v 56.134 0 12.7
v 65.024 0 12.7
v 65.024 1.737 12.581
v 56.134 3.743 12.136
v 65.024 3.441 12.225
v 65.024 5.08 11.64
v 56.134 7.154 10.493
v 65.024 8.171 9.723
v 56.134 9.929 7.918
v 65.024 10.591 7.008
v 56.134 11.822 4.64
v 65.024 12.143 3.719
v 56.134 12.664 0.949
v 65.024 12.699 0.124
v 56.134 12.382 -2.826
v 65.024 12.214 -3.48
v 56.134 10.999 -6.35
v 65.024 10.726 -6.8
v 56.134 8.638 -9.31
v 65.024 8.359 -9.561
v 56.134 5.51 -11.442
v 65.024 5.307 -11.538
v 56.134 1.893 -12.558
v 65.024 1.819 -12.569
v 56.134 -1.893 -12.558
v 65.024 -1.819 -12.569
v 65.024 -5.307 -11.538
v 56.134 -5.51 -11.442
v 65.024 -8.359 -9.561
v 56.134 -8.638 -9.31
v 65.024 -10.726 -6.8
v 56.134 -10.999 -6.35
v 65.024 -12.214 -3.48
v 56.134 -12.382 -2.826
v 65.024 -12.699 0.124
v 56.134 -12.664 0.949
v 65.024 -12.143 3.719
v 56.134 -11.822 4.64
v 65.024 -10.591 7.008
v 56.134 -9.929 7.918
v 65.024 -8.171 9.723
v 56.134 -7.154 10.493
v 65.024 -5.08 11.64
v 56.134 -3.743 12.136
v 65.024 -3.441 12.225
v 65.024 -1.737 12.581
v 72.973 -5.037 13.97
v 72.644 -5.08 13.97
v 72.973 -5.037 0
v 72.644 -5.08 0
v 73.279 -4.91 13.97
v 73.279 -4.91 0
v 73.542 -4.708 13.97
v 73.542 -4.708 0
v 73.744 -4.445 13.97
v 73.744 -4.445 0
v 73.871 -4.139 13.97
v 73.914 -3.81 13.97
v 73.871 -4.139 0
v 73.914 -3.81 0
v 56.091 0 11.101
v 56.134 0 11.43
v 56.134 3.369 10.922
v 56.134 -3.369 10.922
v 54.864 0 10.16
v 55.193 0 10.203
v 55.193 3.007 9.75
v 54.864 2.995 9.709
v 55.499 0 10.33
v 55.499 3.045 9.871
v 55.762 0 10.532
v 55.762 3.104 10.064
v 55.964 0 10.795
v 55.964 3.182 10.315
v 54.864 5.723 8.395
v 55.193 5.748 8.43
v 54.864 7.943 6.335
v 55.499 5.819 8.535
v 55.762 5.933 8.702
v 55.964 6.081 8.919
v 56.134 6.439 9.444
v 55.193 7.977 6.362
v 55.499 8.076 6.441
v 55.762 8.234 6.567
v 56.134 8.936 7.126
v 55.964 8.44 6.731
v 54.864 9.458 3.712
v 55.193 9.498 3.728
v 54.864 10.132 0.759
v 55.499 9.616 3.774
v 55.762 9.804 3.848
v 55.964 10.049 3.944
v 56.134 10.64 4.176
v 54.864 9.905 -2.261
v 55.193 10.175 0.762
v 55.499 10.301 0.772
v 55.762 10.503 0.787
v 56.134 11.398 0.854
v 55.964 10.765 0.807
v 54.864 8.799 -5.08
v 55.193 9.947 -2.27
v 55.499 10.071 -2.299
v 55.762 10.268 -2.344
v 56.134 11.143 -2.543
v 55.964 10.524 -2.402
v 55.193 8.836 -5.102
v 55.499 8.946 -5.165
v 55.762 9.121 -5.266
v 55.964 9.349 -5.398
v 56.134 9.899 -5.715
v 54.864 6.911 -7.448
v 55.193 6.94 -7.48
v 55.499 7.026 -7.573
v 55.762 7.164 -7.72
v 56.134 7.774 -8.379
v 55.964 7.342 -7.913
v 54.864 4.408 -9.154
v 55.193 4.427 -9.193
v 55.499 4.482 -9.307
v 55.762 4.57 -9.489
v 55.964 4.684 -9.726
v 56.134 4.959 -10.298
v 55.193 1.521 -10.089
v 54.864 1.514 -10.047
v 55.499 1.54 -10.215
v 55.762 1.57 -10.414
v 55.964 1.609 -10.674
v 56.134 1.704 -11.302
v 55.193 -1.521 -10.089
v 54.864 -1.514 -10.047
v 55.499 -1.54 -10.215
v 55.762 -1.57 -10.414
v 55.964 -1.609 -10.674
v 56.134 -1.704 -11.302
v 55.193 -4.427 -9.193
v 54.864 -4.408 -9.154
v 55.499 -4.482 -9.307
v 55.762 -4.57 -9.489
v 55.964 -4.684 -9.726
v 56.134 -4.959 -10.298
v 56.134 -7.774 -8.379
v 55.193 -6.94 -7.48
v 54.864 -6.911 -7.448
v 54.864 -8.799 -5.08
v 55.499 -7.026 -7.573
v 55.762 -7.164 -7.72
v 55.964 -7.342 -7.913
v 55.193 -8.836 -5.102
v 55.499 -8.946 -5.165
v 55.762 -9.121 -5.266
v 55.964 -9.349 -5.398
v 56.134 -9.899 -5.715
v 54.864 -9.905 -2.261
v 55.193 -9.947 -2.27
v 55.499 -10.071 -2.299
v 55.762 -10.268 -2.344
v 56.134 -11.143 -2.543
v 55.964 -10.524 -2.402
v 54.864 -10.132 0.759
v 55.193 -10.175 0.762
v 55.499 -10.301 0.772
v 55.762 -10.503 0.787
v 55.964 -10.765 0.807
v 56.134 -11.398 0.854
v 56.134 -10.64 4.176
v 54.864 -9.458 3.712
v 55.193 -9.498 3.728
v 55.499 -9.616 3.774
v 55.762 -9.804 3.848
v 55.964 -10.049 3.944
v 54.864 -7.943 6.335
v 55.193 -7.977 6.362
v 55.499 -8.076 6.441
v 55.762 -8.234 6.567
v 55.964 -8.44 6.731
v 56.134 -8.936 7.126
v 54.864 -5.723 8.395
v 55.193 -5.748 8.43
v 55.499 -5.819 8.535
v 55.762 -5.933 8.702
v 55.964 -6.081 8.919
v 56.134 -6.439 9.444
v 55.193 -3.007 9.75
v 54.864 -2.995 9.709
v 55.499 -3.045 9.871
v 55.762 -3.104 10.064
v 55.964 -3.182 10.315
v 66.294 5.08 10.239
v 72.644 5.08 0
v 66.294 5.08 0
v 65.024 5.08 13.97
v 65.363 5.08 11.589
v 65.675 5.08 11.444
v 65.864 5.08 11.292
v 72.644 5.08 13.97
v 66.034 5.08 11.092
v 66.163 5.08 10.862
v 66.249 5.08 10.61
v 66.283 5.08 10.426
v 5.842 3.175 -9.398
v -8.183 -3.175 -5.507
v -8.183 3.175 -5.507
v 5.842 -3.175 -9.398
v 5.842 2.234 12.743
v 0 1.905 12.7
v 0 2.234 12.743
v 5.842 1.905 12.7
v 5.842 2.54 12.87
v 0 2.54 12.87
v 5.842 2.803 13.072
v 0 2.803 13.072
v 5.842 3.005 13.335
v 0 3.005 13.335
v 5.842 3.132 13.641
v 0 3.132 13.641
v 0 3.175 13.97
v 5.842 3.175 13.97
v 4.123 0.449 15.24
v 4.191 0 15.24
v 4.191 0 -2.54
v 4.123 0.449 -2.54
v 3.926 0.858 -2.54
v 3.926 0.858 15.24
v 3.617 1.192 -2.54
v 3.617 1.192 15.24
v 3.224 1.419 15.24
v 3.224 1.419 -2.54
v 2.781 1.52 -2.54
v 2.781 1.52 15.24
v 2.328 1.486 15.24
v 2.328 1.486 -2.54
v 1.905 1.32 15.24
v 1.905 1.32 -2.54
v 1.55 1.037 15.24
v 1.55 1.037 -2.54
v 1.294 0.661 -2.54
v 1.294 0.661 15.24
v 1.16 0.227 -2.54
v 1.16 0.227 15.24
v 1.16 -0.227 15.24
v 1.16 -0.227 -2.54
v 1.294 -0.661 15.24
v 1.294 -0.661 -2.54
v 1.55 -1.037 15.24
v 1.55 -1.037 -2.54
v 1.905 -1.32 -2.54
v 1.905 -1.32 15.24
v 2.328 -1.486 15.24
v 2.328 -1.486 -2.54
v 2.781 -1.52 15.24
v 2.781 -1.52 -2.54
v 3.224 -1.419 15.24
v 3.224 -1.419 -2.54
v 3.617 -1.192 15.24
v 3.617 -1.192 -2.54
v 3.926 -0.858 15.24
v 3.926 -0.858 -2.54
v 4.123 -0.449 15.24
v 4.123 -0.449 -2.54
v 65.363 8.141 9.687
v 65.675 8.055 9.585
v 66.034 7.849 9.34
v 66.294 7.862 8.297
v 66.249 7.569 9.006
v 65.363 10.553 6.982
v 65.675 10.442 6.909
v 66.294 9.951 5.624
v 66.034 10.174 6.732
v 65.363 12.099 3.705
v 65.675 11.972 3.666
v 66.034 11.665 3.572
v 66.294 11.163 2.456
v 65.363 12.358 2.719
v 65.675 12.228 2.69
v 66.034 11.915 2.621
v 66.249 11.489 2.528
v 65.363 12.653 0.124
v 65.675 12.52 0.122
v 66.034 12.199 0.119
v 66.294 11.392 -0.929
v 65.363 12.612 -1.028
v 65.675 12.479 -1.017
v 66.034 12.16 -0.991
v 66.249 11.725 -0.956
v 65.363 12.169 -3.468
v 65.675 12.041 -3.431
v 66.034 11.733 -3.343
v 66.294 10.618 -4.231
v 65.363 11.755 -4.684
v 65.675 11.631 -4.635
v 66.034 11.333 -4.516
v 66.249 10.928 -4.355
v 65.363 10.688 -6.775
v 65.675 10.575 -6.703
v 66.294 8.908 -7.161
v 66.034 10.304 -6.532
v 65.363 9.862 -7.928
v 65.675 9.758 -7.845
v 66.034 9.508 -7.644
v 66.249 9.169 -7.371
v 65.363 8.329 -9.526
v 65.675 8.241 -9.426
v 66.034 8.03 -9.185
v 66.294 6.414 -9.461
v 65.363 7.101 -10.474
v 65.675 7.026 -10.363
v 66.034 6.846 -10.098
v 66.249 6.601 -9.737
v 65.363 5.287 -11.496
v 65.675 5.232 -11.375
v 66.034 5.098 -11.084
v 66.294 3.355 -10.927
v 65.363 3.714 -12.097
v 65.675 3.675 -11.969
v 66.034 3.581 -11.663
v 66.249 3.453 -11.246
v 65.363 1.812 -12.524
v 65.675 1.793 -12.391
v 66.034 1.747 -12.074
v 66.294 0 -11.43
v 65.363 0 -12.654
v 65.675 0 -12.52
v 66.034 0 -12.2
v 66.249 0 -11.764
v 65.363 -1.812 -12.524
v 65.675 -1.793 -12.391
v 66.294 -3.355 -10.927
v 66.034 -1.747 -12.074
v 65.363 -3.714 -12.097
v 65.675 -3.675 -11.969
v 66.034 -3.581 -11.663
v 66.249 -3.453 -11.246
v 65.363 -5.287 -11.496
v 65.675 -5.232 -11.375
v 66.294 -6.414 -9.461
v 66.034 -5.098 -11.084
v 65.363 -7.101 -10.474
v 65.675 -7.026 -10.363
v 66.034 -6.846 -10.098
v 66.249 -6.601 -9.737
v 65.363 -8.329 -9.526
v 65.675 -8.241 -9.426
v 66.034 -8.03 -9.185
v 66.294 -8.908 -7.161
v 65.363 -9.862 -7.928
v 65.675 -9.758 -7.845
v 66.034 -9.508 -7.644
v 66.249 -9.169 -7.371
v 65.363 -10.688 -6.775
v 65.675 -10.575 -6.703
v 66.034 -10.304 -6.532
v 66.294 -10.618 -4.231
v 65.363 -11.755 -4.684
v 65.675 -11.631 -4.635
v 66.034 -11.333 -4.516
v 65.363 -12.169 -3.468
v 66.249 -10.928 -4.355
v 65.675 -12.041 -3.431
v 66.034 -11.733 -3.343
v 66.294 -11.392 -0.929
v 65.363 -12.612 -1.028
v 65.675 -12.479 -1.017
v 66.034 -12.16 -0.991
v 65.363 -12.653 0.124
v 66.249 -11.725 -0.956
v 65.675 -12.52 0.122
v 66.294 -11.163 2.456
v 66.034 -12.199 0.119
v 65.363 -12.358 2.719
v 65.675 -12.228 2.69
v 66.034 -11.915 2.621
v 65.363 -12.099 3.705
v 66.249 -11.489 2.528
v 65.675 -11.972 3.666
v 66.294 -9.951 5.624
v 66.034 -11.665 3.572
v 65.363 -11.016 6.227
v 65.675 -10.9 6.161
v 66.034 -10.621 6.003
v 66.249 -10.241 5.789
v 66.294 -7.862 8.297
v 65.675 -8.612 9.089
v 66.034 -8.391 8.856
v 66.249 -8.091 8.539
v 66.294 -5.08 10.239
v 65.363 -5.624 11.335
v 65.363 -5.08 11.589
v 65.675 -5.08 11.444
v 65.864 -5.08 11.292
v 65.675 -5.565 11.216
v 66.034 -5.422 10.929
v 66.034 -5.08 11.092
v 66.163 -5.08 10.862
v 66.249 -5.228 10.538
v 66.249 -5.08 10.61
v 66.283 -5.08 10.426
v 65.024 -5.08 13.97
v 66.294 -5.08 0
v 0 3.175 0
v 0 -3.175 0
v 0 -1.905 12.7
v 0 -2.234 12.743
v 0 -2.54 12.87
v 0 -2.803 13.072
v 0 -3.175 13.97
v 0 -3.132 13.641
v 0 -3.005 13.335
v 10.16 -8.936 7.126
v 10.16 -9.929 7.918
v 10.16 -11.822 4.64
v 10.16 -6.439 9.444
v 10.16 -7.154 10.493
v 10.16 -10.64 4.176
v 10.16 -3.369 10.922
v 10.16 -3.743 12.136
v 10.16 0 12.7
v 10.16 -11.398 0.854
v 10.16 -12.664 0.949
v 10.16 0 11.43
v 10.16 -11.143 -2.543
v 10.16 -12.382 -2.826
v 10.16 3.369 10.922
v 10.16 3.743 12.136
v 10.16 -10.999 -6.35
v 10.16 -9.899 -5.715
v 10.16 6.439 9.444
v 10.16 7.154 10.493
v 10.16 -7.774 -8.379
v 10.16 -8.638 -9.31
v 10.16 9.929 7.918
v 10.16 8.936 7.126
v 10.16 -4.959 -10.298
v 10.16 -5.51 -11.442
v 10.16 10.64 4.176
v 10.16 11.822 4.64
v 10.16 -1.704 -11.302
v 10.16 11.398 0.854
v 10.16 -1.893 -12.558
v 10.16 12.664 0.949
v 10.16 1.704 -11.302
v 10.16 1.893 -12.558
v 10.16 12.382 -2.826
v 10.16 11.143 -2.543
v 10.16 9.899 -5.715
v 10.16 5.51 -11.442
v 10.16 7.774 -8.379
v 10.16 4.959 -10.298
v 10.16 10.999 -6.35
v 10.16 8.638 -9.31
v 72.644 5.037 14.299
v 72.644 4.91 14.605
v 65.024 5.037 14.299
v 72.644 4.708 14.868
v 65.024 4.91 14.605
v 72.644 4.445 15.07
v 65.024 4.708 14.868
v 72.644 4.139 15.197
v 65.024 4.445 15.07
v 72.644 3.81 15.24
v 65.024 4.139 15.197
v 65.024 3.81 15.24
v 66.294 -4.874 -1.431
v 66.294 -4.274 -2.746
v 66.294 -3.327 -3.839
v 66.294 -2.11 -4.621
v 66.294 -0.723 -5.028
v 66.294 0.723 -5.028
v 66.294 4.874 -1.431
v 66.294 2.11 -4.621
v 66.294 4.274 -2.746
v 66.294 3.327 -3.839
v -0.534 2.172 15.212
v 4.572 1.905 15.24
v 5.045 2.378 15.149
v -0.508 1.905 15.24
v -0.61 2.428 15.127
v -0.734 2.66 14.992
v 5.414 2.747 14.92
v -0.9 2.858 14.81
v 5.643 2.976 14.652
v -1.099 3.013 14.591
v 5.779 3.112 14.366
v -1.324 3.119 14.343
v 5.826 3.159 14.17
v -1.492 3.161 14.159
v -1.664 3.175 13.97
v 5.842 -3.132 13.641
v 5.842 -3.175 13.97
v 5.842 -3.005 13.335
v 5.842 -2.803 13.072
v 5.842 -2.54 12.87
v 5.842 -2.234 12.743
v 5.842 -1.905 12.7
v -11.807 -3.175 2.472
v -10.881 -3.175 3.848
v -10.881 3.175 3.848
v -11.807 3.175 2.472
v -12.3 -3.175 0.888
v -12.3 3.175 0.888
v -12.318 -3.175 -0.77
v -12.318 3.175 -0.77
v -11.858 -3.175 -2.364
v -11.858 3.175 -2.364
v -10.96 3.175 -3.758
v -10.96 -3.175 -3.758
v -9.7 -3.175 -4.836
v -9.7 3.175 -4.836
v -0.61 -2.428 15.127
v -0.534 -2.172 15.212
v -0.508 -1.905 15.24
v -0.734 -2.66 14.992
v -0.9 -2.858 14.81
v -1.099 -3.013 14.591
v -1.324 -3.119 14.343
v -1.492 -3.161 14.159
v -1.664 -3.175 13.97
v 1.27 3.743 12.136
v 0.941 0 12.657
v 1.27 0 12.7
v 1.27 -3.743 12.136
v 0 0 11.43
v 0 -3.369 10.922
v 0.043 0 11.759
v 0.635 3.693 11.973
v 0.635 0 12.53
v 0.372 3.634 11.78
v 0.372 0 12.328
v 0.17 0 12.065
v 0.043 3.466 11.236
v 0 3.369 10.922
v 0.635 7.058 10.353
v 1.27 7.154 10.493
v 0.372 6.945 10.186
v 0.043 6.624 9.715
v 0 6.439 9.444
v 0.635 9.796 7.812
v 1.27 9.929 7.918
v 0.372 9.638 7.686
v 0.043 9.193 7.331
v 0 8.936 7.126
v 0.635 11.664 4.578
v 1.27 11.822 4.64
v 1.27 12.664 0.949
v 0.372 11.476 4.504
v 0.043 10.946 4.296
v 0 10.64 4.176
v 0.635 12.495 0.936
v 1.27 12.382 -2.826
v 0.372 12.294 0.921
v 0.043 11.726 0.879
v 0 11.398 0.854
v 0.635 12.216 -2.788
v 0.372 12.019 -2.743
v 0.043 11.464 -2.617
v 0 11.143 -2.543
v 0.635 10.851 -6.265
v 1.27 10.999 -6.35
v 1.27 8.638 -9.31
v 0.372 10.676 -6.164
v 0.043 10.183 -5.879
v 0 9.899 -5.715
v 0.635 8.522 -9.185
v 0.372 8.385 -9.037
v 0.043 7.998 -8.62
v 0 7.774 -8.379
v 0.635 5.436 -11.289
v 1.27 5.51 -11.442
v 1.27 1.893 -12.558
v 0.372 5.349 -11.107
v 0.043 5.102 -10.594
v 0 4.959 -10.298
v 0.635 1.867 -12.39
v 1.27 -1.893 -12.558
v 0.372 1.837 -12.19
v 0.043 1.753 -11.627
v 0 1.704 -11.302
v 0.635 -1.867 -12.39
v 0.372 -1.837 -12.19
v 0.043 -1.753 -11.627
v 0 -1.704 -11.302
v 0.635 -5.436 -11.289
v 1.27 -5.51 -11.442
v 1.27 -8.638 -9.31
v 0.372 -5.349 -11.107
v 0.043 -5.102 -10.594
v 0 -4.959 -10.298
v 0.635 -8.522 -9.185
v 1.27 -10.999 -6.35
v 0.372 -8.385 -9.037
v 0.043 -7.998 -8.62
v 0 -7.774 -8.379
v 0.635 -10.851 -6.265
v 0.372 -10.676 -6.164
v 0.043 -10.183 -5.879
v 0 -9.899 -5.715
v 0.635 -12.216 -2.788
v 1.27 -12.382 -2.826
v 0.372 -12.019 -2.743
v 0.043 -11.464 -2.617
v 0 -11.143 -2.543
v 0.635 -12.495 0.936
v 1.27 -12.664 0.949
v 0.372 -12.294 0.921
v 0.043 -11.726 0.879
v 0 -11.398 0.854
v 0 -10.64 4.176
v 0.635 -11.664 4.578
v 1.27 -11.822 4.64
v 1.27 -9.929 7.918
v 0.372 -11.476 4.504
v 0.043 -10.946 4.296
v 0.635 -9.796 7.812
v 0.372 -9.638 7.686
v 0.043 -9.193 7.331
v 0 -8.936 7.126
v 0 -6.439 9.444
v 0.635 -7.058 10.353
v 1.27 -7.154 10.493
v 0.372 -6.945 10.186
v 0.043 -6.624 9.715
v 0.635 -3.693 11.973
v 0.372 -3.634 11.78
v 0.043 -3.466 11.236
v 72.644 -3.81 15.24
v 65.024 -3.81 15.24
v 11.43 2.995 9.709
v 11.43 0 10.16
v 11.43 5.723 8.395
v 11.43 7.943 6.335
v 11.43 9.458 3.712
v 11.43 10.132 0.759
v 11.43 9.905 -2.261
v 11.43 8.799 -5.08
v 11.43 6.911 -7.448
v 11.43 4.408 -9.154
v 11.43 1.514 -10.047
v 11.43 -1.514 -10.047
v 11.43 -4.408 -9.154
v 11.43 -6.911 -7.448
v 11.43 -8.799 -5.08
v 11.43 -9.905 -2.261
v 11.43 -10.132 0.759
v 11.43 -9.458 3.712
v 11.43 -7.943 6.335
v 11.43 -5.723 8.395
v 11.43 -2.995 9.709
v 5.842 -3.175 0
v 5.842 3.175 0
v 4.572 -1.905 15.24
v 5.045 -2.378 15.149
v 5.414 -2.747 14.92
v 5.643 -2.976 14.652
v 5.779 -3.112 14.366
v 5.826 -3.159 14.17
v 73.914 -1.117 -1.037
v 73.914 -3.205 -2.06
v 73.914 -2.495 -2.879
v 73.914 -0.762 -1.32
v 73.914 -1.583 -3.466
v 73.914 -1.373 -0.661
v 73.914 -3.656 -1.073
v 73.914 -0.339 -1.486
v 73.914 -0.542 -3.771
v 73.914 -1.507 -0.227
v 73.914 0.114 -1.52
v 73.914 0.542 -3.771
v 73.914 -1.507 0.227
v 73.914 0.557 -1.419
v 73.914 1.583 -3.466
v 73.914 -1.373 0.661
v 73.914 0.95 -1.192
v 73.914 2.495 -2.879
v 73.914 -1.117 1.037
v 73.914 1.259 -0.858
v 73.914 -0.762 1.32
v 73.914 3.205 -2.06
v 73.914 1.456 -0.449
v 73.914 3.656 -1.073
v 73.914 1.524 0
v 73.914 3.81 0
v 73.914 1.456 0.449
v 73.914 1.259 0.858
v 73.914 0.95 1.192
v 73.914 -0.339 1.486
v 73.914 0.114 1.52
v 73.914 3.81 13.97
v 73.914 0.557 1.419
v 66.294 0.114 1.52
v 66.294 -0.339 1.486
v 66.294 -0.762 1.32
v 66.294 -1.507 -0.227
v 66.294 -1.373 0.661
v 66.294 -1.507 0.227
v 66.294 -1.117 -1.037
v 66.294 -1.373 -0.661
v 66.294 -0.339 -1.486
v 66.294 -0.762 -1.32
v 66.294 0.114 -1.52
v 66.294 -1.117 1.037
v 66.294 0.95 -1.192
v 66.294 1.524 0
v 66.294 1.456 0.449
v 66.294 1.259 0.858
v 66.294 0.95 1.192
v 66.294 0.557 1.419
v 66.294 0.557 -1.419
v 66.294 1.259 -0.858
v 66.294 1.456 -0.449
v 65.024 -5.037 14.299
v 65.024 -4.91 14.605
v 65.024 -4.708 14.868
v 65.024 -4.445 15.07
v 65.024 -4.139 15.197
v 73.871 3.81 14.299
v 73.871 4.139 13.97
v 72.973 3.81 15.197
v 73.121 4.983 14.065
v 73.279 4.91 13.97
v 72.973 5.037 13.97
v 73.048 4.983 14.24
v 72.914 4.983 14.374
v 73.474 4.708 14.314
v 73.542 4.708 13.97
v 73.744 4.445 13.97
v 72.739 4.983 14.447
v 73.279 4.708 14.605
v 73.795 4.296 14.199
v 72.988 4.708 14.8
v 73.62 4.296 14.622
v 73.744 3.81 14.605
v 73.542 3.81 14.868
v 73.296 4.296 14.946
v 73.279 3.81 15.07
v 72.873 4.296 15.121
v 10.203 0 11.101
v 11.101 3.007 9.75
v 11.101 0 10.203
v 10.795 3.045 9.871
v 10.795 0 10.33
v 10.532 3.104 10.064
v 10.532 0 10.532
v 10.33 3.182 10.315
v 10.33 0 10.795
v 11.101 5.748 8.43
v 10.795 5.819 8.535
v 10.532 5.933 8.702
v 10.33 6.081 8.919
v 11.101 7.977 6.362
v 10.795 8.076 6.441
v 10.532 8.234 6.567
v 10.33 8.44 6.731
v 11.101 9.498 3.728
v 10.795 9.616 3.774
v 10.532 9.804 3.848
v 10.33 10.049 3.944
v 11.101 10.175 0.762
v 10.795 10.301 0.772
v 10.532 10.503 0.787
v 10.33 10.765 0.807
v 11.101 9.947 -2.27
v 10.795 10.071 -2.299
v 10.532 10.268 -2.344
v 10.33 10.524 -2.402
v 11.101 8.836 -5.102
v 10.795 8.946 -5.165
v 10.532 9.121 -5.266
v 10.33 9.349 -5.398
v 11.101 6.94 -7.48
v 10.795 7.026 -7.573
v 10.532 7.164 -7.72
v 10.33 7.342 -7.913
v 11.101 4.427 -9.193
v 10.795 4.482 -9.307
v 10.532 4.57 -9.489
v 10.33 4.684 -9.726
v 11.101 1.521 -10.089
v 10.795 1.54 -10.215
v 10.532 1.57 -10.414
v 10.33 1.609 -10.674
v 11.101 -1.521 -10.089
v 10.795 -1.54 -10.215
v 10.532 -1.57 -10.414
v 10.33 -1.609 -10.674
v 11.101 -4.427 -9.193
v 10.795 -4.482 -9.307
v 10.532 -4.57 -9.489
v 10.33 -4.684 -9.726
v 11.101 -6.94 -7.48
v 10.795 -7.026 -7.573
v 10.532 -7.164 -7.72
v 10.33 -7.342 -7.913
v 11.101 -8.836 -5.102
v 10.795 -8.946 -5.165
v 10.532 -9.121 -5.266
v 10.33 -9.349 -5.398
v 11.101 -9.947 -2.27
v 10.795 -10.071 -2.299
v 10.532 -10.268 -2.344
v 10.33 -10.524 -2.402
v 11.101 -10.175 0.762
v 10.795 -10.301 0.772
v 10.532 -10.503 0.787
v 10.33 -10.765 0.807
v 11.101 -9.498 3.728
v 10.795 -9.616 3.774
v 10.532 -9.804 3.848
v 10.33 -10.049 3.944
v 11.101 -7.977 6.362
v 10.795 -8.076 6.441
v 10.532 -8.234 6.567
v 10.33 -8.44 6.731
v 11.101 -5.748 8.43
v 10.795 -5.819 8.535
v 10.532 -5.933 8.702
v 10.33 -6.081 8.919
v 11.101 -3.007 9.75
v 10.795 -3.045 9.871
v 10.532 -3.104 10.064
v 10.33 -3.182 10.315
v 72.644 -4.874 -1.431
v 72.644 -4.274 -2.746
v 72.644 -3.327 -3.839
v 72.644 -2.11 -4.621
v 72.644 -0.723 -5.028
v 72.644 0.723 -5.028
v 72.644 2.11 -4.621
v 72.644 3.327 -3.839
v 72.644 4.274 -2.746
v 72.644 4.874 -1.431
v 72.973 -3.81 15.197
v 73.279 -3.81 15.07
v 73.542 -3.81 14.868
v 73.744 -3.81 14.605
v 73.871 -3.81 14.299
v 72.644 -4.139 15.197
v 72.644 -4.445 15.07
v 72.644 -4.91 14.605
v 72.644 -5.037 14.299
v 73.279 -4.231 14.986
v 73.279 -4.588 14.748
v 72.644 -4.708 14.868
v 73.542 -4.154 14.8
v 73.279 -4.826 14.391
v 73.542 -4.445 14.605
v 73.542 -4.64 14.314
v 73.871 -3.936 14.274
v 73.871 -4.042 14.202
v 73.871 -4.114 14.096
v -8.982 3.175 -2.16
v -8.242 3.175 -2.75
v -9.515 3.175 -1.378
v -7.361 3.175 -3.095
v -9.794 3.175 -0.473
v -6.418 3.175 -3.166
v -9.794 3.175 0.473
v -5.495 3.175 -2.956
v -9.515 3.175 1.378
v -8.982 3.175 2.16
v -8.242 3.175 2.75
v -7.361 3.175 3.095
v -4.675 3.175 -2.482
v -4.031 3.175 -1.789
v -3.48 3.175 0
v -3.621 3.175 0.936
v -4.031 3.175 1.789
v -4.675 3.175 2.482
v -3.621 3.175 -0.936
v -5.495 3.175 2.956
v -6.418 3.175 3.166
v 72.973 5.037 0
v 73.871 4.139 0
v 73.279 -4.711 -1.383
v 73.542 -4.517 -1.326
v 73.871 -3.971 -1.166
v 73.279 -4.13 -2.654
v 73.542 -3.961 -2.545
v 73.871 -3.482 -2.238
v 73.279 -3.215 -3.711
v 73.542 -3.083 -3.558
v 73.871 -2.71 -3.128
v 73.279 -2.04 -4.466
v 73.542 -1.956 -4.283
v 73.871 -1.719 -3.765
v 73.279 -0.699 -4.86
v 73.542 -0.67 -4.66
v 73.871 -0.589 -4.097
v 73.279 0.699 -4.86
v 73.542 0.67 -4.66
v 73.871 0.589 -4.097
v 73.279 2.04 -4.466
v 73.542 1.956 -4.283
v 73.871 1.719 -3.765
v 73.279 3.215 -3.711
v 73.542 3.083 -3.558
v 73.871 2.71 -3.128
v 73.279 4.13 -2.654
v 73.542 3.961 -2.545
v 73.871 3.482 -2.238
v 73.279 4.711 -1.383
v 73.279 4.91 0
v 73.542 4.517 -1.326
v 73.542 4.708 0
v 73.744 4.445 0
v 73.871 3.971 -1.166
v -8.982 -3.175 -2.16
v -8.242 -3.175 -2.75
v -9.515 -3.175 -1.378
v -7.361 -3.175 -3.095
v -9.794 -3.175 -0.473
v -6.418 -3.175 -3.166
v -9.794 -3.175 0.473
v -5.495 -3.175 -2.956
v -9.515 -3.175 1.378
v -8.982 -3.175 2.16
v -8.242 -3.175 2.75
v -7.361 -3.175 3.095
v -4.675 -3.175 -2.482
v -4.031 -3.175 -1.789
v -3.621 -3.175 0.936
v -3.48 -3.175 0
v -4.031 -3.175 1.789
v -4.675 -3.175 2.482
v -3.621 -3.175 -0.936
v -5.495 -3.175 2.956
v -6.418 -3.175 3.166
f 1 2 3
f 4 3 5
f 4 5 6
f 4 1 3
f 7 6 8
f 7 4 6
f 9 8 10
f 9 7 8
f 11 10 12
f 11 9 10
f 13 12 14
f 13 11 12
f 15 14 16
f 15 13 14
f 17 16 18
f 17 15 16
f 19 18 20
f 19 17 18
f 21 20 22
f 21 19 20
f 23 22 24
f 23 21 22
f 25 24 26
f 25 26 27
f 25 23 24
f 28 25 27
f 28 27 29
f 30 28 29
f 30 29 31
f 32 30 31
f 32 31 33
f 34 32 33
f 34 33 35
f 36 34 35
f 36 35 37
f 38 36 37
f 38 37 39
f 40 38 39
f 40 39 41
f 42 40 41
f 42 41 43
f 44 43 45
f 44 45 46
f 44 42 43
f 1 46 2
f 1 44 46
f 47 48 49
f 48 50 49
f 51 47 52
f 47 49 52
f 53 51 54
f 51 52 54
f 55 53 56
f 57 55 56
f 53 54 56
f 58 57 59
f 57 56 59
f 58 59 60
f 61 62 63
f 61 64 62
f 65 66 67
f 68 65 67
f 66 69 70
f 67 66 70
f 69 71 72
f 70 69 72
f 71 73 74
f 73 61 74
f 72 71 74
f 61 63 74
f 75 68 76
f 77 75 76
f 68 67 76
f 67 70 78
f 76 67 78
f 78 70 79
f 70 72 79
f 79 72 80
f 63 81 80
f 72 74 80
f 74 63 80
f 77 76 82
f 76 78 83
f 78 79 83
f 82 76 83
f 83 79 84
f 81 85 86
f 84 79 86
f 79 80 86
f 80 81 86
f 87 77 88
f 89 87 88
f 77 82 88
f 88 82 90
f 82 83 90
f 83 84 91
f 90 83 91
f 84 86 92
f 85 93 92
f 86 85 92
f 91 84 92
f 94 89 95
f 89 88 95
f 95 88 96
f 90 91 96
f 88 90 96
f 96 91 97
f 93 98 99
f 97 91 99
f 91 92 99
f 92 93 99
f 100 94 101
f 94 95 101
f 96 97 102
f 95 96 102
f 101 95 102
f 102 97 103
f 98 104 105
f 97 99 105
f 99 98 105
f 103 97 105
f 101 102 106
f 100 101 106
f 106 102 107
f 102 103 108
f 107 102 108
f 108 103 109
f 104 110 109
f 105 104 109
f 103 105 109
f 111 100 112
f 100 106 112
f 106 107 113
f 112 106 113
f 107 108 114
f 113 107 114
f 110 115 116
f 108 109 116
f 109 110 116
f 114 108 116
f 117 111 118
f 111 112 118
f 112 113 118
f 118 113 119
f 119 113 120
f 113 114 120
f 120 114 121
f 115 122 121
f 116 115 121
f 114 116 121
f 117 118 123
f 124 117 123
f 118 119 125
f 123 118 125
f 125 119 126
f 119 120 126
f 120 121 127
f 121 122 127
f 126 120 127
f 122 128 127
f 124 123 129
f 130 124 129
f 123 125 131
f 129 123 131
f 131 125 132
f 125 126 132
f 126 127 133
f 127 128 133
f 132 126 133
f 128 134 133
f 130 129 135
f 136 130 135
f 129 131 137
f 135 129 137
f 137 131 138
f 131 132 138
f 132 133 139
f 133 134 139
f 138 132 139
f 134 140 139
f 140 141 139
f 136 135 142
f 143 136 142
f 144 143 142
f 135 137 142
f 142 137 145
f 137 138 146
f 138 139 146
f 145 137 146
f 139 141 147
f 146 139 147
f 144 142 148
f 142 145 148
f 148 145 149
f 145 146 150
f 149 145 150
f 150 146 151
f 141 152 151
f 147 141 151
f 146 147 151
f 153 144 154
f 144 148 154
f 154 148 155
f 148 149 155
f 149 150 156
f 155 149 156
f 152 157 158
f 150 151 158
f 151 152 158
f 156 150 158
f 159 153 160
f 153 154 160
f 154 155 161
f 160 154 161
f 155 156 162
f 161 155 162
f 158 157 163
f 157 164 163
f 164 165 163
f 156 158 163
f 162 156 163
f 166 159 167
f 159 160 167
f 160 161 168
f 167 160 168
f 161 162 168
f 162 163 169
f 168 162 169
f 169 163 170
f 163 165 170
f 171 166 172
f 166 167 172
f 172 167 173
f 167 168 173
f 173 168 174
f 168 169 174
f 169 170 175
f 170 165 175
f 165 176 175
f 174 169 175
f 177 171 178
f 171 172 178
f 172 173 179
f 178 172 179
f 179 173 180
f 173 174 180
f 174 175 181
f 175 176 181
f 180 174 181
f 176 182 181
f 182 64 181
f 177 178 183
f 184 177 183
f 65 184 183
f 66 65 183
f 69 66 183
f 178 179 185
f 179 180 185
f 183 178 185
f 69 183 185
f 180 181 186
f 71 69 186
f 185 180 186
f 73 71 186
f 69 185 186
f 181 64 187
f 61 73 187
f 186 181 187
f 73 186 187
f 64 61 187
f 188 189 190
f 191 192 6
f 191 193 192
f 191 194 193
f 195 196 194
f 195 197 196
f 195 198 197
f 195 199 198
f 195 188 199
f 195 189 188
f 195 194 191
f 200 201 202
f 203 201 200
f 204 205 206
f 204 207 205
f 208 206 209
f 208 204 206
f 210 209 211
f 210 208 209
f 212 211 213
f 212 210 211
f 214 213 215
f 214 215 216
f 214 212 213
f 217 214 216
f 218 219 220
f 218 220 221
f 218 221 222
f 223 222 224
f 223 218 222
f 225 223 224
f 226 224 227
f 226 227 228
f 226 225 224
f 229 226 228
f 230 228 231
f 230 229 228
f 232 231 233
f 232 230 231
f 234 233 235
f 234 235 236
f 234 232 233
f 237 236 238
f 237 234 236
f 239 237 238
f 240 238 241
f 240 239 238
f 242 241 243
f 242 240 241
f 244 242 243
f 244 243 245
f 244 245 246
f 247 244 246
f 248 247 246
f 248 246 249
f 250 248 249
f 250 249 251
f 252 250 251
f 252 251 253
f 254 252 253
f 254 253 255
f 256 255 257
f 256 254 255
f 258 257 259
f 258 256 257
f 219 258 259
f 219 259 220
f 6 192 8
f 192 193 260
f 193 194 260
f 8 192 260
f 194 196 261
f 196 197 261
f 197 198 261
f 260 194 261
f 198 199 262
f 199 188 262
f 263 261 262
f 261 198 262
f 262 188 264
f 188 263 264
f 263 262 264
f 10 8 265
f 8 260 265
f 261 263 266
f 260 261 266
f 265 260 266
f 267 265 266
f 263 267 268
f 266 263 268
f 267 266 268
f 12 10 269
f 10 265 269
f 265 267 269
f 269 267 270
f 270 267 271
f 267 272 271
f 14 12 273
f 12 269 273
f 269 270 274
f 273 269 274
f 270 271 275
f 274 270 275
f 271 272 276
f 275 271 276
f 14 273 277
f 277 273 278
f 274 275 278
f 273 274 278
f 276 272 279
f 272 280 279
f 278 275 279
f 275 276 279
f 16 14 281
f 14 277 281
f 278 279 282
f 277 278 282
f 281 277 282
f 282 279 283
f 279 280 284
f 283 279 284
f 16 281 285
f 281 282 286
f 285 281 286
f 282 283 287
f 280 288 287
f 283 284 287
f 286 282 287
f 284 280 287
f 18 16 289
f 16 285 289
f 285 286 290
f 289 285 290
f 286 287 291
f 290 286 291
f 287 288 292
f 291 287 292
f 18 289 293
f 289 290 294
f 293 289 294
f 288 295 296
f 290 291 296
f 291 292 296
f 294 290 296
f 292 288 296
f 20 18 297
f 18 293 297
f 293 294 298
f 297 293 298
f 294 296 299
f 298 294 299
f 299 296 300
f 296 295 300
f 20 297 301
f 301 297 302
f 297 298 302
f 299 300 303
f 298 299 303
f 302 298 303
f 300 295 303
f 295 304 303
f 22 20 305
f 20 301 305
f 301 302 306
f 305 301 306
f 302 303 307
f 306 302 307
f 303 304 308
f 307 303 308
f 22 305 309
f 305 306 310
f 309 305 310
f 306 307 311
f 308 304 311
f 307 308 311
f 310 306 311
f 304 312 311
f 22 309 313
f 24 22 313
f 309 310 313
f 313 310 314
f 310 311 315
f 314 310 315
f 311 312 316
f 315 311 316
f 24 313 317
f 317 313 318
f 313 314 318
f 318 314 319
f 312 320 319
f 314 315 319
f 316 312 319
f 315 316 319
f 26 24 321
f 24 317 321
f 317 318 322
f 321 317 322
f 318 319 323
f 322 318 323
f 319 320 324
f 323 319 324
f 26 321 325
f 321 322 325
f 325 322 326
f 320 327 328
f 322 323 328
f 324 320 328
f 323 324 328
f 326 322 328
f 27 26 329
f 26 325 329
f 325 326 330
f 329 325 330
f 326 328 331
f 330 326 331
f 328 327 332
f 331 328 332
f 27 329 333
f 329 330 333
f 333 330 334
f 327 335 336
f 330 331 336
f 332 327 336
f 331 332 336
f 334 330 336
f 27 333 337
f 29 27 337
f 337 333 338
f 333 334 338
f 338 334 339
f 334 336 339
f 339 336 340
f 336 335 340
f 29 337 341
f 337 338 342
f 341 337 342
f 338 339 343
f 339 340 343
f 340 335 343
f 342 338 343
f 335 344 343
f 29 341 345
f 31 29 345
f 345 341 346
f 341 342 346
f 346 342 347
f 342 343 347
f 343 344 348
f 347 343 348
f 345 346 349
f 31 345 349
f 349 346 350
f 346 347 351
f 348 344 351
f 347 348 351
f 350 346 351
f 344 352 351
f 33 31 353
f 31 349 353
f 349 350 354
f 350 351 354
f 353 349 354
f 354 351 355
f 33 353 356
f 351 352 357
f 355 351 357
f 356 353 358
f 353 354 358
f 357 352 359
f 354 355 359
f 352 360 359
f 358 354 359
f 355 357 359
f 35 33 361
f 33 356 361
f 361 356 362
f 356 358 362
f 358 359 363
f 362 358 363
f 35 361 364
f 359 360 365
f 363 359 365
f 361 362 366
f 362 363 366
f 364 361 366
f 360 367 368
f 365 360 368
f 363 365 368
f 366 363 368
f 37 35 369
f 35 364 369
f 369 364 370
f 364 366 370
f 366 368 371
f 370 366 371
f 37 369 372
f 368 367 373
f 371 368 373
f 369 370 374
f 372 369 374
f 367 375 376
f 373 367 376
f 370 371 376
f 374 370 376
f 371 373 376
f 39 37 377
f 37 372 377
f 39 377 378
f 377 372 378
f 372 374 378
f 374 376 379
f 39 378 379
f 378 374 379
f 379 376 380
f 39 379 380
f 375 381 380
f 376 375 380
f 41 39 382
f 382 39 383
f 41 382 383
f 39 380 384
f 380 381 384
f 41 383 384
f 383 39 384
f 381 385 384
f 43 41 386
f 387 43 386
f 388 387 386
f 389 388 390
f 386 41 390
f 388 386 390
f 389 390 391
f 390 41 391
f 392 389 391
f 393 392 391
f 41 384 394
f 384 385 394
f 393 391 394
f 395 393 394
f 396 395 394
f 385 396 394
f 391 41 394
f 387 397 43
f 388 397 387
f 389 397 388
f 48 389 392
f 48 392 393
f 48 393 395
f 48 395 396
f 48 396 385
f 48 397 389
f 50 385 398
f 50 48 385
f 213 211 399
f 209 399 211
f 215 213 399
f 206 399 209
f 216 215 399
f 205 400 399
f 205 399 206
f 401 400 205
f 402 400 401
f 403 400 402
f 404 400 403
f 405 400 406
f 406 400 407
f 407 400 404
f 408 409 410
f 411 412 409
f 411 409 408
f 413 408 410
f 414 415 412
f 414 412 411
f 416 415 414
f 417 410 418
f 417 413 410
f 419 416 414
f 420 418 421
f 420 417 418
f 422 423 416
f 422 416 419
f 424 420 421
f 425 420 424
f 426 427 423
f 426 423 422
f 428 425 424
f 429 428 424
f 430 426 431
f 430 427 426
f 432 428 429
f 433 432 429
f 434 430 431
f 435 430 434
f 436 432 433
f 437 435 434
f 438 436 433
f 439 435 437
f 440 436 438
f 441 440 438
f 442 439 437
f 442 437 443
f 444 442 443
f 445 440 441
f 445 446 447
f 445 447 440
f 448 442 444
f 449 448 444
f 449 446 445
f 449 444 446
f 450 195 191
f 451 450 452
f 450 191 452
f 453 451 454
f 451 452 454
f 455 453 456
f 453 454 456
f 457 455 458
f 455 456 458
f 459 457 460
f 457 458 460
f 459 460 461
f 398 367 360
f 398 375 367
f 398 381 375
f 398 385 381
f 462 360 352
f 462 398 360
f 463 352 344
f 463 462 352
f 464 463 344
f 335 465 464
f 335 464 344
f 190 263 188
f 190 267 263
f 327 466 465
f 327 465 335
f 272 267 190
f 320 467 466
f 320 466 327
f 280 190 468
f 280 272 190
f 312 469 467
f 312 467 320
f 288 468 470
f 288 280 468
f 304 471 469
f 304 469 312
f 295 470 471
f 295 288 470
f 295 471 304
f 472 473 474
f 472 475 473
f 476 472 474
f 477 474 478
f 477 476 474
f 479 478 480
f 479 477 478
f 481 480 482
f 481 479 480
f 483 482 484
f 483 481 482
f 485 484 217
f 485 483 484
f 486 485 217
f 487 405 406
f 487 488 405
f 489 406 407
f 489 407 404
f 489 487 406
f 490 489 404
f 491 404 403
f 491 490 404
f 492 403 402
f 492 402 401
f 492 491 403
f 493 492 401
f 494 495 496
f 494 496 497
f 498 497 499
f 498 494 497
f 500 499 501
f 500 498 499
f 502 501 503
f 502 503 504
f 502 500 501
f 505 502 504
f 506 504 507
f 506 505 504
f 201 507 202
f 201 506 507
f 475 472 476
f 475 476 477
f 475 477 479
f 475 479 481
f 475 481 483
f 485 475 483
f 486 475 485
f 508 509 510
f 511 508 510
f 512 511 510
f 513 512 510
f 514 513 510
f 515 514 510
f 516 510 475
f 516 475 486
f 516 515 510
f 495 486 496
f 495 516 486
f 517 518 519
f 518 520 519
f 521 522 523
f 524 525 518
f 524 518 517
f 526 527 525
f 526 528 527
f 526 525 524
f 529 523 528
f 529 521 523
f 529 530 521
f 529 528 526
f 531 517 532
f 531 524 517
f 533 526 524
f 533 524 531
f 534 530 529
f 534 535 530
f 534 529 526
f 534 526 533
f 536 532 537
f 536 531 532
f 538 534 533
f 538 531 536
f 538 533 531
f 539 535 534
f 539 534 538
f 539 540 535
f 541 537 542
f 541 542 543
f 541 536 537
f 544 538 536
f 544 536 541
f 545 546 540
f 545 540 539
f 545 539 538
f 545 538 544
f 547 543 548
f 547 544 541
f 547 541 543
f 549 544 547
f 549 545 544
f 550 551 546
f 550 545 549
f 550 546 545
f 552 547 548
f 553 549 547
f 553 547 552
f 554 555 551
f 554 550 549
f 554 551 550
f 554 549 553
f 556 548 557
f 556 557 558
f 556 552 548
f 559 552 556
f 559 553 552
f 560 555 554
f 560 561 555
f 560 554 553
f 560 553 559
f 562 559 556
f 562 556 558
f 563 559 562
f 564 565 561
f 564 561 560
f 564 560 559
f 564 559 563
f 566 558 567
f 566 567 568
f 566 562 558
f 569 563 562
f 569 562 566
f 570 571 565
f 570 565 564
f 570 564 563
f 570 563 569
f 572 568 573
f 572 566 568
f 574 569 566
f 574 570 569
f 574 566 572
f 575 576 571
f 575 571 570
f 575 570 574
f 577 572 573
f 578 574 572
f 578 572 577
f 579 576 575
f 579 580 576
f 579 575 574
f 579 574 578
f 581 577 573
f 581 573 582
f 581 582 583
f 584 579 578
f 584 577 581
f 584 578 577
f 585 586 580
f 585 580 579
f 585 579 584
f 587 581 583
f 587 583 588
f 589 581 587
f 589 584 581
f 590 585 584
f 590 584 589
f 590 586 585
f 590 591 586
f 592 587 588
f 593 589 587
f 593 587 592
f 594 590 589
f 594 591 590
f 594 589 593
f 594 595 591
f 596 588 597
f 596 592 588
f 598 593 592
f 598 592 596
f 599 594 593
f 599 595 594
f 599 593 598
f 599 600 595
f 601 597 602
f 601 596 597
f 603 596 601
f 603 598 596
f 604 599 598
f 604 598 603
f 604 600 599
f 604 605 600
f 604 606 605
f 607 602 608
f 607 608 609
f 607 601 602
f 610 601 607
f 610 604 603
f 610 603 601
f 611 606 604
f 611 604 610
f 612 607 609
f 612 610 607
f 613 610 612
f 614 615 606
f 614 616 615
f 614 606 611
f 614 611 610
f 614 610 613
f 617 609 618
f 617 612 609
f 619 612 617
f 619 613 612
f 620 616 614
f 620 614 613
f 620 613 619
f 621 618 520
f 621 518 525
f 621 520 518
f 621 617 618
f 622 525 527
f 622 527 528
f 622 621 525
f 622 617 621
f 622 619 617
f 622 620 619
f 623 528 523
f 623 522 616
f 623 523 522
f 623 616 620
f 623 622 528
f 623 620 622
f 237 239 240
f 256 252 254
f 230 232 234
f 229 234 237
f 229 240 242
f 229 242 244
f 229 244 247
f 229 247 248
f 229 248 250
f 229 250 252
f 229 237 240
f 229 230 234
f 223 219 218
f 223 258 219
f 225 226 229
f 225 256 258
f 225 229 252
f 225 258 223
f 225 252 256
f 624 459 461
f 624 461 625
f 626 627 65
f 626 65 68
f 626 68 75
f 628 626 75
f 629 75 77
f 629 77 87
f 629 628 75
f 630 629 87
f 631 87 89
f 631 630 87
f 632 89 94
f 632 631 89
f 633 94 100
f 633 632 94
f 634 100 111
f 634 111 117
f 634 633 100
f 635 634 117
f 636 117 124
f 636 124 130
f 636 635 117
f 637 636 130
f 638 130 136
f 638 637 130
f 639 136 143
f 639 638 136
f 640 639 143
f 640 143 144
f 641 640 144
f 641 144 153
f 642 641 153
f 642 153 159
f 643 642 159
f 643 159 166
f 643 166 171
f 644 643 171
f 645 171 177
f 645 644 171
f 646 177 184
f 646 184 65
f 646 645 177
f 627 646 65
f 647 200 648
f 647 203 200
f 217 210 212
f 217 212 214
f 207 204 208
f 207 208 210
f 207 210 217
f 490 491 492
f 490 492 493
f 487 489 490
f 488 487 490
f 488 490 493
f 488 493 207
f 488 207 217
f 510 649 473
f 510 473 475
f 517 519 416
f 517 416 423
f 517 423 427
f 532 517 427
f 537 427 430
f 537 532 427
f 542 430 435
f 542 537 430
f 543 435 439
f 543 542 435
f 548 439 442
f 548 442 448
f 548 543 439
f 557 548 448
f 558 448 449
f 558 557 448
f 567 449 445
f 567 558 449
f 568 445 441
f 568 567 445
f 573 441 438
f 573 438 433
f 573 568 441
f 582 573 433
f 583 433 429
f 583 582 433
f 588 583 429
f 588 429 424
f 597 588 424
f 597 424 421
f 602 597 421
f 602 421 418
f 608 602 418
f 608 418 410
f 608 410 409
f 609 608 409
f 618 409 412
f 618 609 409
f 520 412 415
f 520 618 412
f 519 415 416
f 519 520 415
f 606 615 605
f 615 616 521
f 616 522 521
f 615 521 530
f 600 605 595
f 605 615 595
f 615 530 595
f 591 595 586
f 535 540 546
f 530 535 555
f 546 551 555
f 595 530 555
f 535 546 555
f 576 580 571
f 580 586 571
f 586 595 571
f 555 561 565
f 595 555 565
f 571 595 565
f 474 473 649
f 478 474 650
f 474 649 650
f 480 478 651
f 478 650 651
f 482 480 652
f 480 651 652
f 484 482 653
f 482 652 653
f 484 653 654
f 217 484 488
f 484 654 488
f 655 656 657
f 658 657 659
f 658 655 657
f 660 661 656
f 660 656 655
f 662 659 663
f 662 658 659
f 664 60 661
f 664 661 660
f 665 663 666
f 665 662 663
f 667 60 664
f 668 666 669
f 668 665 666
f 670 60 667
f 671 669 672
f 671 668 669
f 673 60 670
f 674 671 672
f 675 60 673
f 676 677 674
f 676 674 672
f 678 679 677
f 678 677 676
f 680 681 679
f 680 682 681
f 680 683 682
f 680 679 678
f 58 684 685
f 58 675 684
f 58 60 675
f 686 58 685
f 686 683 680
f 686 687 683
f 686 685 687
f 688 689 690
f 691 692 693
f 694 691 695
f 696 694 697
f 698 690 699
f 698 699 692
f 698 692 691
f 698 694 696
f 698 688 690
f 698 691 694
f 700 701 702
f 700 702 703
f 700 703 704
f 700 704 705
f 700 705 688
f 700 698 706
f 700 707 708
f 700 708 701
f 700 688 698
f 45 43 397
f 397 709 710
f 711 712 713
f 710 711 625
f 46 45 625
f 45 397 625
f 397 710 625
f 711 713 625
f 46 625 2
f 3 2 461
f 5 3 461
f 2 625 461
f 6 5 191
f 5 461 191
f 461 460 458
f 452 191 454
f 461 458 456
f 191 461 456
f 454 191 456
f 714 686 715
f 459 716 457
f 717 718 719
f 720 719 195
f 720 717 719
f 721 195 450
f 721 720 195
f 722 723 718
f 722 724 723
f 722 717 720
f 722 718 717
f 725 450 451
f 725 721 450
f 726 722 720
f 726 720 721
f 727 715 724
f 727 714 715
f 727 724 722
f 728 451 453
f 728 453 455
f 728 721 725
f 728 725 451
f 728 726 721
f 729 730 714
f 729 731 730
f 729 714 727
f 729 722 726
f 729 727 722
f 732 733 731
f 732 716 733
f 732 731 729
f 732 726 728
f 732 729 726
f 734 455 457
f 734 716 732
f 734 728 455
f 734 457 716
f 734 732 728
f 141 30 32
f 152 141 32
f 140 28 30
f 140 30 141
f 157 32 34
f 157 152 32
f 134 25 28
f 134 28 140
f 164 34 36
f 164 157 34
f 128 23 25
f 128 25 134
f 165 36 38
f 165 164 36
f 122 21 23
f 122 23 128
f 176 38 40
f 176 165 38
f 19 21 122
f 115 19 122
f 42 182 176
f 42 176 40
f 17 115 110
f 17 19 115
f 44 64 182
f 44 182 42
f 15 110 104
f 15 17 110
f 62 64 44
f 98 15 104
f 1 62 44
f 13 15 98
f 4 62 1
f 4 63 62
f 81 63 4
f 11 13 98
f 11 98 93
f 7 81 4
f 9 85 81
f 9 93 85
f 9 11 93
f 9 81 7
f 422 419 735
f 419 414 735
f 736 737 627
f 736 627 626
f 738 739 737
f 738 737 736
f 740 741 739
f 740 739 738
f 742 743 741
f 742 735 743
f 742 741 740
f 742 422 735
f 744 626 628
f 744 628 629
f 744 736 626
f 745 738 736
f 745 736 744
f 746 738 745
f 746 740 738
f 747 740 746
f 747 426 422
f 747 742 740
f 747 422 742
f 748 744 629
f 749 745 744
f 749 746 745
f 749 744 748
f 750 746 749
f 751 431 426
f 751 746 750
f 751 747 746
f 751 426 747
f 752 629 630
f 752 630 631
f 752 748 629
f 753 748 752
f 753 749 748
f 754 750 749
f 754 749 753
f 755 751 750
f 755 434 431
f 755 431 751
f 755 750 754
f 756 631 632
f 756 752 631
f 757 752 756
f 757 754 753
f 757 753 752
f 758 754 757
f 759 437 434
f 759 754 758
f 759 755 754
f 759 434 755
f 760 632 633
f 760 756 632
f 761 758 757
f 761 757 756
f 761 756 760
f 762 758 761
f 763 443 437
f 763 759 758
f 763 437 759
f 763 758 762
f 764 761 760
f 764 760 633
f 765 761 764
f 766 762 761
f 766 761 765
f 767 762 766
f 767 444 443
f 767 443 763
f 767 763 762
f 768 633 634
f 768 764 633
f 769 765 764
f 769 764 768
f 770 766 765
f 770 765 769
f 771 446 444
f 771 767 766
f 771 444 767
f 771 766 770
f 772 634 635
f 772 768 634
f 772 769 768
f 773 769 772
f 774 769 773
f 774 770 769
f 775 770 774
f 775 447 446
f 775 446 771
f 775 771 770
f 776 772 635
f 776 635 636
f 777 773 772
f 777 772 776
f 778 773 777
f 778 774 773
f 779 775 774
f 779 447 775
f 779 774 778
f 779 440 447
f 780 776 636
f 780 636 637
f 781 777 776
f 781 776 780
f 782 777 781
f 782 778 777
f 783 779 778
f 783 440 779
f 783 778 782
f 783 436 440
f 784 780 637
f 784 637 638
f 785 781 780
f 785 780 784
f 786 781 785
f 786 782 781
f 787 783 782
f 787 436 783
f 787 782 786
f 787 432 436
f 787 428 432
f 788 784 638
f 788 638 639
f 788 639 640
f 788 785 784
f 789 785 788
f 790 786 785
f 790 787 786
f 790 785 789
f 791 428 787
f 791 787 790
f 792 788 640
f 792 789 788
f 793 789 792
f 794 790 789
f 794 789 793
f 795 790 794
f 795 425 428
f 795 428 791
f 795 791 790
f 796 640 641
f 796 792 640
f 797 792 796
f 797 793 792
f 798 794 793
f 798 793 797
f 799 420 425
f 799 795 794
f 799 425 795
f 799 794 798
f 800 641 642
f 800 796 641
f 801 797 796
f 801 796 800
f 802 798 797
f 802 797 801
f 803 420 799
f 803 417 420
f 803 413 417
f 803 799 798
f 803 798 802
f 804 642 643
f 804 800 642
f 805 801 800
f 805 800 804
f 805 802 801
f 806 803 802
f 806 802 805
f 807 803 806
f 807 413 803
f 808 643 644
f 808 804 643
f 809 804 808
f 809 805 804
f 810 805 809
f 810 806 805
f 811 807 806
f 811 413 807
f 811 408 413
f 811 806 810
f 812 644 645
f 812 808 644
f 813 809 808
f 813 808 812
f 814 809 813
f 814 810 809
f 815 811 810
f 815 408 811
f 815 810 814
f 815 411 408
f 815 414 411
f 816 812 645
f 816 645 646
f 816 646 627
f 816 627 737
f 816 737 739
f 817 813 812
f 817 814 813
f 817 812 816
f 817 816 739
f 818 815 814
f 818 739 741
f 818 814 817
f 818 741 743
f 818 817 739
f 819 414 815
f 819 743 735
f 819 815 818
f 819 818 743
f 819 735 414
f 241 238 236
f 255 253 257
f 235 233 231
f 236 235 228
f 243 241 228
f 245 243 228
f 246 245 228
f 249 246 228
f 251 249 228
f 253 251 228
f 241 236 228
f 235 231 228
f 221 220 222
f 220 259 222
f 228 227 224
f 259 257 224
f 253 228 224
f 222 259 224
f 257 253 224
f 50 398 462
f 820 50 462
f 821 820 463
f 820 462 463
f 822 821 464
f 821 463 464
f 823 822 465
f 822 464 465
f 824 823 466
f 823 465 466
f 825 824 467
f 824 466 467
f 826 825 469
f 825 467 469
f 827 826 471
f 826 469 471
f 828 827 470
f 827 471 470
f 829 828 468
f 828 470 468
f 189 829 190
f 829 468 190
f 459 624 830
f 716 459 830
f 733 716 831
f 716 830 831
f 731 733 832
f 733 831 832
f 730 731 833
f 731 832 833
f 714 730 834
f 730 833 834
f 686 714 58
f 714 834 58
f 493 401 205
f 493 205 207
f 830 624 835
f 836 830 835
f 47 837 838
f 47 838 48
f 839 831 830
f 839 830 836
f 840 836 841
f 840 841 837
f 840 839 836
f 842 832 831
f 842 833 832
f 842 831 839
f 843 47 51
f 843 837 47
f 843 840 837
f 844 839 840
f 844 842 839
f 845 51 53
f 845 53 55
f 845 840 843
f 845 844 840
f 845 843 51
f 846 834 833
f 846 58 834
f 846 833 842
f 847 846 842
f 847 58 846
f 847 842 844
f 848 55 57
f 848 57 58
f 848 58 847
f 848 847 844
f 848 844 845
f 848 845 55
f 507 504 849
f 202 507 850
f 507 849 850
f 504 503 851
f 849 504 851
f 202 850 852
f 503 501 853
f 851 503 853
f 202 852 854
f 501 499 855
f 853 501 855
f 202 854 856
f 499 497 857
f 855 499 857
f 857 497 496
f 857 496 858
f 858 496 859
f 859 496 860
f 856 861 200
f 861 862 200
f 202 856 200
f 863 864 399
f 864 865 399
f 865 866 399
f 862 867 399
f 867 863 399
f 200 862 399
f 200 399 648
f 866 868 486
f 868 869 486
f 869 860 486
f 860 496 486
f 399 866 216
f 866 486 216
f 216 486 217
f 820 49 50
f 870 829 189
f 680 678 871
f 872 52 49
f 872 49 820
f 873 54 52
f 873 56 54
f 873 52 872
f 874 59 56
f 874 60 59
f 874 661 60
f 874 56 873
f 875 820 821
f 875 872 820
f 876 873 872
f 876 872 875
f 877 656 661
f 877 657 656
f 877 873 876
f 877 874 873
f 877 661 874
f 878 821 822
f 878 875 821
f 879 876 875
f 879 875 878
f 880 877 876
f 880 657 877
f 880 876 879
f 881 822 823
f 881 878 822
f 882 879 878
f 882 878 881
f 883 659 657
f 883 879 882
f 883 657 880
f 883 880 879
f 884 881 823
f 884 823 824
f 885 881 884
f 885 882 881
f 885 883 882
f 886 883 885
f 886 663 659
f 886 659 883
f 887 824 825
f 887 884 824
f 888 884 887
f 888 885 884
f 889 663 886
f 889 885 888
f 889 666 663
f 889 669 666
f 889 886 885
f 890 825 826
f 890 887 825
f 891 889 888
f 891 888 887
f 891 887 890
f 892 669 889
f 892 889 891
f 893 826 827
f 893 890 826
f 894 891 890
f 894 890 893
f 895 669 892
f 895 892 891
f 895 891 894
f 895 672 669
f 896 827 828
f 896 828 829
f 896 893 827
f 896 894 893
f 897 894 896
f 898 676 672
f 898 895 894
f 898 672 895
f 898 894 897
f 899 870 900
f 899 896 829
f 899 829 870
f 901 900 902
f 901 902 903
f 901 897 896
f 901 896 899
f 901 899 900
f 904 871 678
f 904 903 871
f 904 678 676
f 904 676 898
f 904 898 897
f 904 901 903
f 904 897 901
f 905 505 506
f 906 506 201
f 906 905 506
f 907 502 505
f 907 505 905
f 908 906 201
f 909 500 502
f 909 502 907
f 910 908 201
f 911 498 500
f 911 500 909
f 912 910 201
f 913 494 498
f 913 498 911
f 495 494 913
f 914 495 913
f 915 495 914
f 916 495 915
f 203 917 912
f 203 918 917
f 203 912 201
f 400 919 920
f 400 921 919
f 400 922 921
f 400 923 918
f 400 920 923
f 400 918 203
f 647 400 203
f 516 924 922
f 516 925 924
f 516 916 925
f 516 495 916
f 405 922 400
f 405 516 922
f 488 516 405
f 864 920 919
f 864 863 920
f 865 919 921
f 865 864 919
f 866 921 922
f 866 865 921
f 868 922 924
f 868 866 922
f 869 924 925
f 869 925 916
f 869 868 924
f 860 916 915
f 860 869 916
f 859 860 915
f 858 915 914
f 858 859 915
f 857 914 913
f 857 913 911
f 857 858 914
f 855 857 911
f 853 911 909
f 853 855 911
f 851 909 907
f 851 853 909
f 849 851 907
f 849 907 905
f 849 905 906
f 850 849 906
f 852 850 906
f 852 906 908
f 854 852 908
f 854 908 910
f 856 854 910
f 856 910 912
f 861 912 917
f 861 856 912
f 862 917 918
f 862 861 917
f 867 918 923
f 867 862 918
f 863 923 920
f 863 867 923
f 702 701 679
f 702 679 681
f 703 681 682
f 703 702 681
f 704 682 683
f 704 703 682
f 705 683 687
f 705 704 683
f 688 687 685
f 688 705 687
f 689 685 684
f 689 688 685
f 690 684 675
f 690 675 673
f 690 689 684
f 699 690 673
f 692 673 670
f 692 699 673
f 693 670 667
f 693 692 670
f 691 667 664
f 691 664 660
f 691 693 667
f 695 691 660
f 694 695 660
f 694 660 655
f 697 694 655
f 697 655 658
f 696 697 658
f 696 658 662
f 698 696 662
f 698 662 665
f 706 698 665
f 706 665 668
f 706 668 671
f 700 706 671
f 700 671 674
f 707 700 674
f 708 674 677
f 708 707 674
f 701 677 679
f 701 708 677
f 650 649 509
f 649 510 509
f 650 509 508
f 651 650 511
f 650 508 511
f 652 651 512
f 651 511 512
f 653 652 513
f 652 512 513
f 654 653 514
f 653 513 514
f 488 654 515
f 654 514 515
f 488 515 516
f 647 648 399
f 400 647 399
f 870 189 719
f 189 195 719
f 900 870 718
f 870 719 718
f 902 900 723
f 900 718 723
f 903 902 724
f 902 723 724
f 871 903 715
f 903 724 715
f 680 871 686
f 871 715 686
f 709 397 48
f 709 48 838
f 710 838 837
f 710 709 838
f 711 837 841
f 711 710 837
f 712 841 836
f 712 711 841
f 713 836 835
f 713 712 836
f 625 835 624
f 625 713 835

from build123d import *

# Parameters (mm, degrees)
F0_W          = 5.842
F0_H          = 12.7
F0_R          = 3.175
F2_DEPTH      = 3.175
F3_R          = 1.524
F4_DEPTH      = 7.62
F4_DEPTH_BACK = 1.27
F7_R          = 1.524
F8_DEPTH      = 17.78
F9_R          = 1.27
F10_R         = 1.27
F11_T1_DEPTH  = 15.24
F12_R         = 1.26999
F12_2_R       = 1.26999
F13_R         = 1.27


# Not quite as in the source:
# - a fillet or chamfer that OpenCascade refuses, or shapes differently, is made with other operations: its cross-section is extruded or revolved along the edge and cut away or added
# - a fillet or chamfer is up to 0.001 mm smaller than in the source, because OpenCascade refuses the exact size
# - the program builds the solid bodies; features that only make, move or delete a surface that nothing else refers to are left out


with BuildPart() as f1:
    # F0 (on Front) → F1 (revolve)
    with BuildSketch(Plane.XZ):
        Polygon((5.842, 12.7), (5.842, 0), (66.294, 0), (66.294, 12.7), (56.134, 12.7), (56.134, 10.16), (10.16, 10.16), (10.16, 12.7), align=None)
        with Locations((2.921, 6.35)):
            Rectangle(F0_W, F0_H)
    revolve(axis=Axis((33.147, 0, 0), (-1, 0, 0)))

    # F3 (on face) → F4 (join, two sides)
    with BuildSketch(Plane.YZ.offset(66.294)) as f4_sk:
        with BuildLine():
            ThreePointArc((-5.08, 0), (0, -5.08), (5.08, 0))
            ThreePointArc((5.08, 0), (0, 5.08), (-5.08, 0))
        make_face()
        Circle(F3_R, mode=Mode.SUBTRACT)
        with BuildLine():
            ThreePointArc((-5.08, 0), (0, 5.08), (5.08, 0))
            Line((5.08, 0), (5.08, 15.24))
            Line((5.08, 15.24), (-5.08, 15.24))
            Line((-5.08, 15.24), (-5.08, 0))
        make_face()
    extrude(amount=F4_DEPTH)
    extrude(f4_sk.sketch, amount=-F4_DEPTH_BACK)

    # F9
    f9_edges = [f1.edges().sort_by_distance(p)[0] for p in [
        (10.16, 0, -10.16),
    ]]
    fillet(f9_edges, radius=F9_R)

    # F10
    f10_edges = [f1.edges().sort_by_distance(p)[0] for p in [
        (56.134, 0, -10.16),
    ]]
    fillet(f10_edges, radius=F10_R)

    # F11: fillet of radius 1.27 on 1 edges, made by hand

    # F11_s2 → F11_t1 (cut)
    with BuildSketch(Plane.YZ.offset(61.849)):
        with BuildLine():
            ThreePointArc((-5.08, 13.97), (-4.7080256121, 14.8680256121), (-3.81, 15.24))
            Line((-3.81, 15.24), (-5.08, 15.24))
            Line((-5.08, 15.24), (-5.08, 13.97))
        make_face()
    extrude(amount=F11_T1_DEPTH, mode=Mode.SUBTRACT)

    # F12 (radius 1.27 in the source; OpenCascade refuses exactly that, so slightly less here)
    f12_edges = [f1.edges().sort_by_distance(p)[0] for p in [
        (73.914, 0.635, 15.24),
        (69.469, 5.08, 15.24),
        (66.294, 0, -12.7),
    ]]
    fillet(f12_edges, radius=F12_R)

    # F13
    f13_edges = [f1.edges().sort_by_distance(p)[0] for p in [
        (0, 0, -12.7),
    ]]
    fillet(f13_edges, radius=F13_R)


with BuildPart() as f2:
    # F0 (on Front) → F2 (new body, symmetric)
    with BuildSketch(Plane.XZ):
        with BuildLine():
            Line((-0.9398, 0), (0, 0))
            Line((0, 0), (0, 12.7))
            Line((0, 12.7), (5.842, 12.7))
            Line((5.842, 12.7), (5.842, 15.24))
            Line((5.842, 15.24), (-0.508, 15.24))
            Line((-0.508, 15.24), (-10.8806298187, 3.8475430269))
            ThreePointArc((-10.8806298187, 3.8475430269), (-4.5919612295, 5.3297205562), (-0.9398, 0))
        make_face()
        with BuildLine():
            ThreePointArc((-8.1826630726, -5.5069827884), (-3.1957909266, -4.5493385486), (-0.9398, 0))
            ThreePointArc((-0.9398, 0), (-4.5919612295, 5.3297205562), (-10.8806298187, 3.8475430269))
            ThreePointArc((-10.8806298187, 3.8475430269), (-12.1459778134, -1.5837270034), (-8.1826630726, -5.5069827884))
        make_face()
        with Locations((-6.6548, 0)):
            Circle(F0_R, mode=Mode.SUBTRACT)
        with BuildLine():
            Line((5.842, 0), (0, 0))
            Line((0, 0), (-0.9398, 0))
            ThreePointArc((-0.9398, 0), (-3.1957909266, -4.5493385486), (-8.1826630726, -5.5069827884))
            Line((-8.1826630726, -5.5069827884), (5.842, -9.398))
            Line((5.842, -9.398), (5.842, 0))
        make_face()
    extrude(amount=F2_DEPTH, both=True)

    # F12#2 (radius 1.27 in the source; OpenCascade refuses exactly that, so slightly less here)
    f12_2_edges = [f2.edges().sort_by_distance(p)[0] for p in [
        (2.667, -3.175, 15.24),
        (2.921, -3.175, 12.7),
        (2.667, 3.175, 15.24),
        (2.921, 3.175, 12.7),
        (5.842, 0, 15.24),
    ]]
    fillet(f12_2_edges, radius=F12_2_R)


with BuildPart() as f8:
    # F7 (on face) → F8 (new body)
    with BuildSketch(Plane.XY.offset(15.24)):
        with Locations((2.667, 0)):
            Circle(F7_R)
    extrude(amount=-F8_DEPTH)


solid = Compound([f1.part, f2.part, f8.part])
